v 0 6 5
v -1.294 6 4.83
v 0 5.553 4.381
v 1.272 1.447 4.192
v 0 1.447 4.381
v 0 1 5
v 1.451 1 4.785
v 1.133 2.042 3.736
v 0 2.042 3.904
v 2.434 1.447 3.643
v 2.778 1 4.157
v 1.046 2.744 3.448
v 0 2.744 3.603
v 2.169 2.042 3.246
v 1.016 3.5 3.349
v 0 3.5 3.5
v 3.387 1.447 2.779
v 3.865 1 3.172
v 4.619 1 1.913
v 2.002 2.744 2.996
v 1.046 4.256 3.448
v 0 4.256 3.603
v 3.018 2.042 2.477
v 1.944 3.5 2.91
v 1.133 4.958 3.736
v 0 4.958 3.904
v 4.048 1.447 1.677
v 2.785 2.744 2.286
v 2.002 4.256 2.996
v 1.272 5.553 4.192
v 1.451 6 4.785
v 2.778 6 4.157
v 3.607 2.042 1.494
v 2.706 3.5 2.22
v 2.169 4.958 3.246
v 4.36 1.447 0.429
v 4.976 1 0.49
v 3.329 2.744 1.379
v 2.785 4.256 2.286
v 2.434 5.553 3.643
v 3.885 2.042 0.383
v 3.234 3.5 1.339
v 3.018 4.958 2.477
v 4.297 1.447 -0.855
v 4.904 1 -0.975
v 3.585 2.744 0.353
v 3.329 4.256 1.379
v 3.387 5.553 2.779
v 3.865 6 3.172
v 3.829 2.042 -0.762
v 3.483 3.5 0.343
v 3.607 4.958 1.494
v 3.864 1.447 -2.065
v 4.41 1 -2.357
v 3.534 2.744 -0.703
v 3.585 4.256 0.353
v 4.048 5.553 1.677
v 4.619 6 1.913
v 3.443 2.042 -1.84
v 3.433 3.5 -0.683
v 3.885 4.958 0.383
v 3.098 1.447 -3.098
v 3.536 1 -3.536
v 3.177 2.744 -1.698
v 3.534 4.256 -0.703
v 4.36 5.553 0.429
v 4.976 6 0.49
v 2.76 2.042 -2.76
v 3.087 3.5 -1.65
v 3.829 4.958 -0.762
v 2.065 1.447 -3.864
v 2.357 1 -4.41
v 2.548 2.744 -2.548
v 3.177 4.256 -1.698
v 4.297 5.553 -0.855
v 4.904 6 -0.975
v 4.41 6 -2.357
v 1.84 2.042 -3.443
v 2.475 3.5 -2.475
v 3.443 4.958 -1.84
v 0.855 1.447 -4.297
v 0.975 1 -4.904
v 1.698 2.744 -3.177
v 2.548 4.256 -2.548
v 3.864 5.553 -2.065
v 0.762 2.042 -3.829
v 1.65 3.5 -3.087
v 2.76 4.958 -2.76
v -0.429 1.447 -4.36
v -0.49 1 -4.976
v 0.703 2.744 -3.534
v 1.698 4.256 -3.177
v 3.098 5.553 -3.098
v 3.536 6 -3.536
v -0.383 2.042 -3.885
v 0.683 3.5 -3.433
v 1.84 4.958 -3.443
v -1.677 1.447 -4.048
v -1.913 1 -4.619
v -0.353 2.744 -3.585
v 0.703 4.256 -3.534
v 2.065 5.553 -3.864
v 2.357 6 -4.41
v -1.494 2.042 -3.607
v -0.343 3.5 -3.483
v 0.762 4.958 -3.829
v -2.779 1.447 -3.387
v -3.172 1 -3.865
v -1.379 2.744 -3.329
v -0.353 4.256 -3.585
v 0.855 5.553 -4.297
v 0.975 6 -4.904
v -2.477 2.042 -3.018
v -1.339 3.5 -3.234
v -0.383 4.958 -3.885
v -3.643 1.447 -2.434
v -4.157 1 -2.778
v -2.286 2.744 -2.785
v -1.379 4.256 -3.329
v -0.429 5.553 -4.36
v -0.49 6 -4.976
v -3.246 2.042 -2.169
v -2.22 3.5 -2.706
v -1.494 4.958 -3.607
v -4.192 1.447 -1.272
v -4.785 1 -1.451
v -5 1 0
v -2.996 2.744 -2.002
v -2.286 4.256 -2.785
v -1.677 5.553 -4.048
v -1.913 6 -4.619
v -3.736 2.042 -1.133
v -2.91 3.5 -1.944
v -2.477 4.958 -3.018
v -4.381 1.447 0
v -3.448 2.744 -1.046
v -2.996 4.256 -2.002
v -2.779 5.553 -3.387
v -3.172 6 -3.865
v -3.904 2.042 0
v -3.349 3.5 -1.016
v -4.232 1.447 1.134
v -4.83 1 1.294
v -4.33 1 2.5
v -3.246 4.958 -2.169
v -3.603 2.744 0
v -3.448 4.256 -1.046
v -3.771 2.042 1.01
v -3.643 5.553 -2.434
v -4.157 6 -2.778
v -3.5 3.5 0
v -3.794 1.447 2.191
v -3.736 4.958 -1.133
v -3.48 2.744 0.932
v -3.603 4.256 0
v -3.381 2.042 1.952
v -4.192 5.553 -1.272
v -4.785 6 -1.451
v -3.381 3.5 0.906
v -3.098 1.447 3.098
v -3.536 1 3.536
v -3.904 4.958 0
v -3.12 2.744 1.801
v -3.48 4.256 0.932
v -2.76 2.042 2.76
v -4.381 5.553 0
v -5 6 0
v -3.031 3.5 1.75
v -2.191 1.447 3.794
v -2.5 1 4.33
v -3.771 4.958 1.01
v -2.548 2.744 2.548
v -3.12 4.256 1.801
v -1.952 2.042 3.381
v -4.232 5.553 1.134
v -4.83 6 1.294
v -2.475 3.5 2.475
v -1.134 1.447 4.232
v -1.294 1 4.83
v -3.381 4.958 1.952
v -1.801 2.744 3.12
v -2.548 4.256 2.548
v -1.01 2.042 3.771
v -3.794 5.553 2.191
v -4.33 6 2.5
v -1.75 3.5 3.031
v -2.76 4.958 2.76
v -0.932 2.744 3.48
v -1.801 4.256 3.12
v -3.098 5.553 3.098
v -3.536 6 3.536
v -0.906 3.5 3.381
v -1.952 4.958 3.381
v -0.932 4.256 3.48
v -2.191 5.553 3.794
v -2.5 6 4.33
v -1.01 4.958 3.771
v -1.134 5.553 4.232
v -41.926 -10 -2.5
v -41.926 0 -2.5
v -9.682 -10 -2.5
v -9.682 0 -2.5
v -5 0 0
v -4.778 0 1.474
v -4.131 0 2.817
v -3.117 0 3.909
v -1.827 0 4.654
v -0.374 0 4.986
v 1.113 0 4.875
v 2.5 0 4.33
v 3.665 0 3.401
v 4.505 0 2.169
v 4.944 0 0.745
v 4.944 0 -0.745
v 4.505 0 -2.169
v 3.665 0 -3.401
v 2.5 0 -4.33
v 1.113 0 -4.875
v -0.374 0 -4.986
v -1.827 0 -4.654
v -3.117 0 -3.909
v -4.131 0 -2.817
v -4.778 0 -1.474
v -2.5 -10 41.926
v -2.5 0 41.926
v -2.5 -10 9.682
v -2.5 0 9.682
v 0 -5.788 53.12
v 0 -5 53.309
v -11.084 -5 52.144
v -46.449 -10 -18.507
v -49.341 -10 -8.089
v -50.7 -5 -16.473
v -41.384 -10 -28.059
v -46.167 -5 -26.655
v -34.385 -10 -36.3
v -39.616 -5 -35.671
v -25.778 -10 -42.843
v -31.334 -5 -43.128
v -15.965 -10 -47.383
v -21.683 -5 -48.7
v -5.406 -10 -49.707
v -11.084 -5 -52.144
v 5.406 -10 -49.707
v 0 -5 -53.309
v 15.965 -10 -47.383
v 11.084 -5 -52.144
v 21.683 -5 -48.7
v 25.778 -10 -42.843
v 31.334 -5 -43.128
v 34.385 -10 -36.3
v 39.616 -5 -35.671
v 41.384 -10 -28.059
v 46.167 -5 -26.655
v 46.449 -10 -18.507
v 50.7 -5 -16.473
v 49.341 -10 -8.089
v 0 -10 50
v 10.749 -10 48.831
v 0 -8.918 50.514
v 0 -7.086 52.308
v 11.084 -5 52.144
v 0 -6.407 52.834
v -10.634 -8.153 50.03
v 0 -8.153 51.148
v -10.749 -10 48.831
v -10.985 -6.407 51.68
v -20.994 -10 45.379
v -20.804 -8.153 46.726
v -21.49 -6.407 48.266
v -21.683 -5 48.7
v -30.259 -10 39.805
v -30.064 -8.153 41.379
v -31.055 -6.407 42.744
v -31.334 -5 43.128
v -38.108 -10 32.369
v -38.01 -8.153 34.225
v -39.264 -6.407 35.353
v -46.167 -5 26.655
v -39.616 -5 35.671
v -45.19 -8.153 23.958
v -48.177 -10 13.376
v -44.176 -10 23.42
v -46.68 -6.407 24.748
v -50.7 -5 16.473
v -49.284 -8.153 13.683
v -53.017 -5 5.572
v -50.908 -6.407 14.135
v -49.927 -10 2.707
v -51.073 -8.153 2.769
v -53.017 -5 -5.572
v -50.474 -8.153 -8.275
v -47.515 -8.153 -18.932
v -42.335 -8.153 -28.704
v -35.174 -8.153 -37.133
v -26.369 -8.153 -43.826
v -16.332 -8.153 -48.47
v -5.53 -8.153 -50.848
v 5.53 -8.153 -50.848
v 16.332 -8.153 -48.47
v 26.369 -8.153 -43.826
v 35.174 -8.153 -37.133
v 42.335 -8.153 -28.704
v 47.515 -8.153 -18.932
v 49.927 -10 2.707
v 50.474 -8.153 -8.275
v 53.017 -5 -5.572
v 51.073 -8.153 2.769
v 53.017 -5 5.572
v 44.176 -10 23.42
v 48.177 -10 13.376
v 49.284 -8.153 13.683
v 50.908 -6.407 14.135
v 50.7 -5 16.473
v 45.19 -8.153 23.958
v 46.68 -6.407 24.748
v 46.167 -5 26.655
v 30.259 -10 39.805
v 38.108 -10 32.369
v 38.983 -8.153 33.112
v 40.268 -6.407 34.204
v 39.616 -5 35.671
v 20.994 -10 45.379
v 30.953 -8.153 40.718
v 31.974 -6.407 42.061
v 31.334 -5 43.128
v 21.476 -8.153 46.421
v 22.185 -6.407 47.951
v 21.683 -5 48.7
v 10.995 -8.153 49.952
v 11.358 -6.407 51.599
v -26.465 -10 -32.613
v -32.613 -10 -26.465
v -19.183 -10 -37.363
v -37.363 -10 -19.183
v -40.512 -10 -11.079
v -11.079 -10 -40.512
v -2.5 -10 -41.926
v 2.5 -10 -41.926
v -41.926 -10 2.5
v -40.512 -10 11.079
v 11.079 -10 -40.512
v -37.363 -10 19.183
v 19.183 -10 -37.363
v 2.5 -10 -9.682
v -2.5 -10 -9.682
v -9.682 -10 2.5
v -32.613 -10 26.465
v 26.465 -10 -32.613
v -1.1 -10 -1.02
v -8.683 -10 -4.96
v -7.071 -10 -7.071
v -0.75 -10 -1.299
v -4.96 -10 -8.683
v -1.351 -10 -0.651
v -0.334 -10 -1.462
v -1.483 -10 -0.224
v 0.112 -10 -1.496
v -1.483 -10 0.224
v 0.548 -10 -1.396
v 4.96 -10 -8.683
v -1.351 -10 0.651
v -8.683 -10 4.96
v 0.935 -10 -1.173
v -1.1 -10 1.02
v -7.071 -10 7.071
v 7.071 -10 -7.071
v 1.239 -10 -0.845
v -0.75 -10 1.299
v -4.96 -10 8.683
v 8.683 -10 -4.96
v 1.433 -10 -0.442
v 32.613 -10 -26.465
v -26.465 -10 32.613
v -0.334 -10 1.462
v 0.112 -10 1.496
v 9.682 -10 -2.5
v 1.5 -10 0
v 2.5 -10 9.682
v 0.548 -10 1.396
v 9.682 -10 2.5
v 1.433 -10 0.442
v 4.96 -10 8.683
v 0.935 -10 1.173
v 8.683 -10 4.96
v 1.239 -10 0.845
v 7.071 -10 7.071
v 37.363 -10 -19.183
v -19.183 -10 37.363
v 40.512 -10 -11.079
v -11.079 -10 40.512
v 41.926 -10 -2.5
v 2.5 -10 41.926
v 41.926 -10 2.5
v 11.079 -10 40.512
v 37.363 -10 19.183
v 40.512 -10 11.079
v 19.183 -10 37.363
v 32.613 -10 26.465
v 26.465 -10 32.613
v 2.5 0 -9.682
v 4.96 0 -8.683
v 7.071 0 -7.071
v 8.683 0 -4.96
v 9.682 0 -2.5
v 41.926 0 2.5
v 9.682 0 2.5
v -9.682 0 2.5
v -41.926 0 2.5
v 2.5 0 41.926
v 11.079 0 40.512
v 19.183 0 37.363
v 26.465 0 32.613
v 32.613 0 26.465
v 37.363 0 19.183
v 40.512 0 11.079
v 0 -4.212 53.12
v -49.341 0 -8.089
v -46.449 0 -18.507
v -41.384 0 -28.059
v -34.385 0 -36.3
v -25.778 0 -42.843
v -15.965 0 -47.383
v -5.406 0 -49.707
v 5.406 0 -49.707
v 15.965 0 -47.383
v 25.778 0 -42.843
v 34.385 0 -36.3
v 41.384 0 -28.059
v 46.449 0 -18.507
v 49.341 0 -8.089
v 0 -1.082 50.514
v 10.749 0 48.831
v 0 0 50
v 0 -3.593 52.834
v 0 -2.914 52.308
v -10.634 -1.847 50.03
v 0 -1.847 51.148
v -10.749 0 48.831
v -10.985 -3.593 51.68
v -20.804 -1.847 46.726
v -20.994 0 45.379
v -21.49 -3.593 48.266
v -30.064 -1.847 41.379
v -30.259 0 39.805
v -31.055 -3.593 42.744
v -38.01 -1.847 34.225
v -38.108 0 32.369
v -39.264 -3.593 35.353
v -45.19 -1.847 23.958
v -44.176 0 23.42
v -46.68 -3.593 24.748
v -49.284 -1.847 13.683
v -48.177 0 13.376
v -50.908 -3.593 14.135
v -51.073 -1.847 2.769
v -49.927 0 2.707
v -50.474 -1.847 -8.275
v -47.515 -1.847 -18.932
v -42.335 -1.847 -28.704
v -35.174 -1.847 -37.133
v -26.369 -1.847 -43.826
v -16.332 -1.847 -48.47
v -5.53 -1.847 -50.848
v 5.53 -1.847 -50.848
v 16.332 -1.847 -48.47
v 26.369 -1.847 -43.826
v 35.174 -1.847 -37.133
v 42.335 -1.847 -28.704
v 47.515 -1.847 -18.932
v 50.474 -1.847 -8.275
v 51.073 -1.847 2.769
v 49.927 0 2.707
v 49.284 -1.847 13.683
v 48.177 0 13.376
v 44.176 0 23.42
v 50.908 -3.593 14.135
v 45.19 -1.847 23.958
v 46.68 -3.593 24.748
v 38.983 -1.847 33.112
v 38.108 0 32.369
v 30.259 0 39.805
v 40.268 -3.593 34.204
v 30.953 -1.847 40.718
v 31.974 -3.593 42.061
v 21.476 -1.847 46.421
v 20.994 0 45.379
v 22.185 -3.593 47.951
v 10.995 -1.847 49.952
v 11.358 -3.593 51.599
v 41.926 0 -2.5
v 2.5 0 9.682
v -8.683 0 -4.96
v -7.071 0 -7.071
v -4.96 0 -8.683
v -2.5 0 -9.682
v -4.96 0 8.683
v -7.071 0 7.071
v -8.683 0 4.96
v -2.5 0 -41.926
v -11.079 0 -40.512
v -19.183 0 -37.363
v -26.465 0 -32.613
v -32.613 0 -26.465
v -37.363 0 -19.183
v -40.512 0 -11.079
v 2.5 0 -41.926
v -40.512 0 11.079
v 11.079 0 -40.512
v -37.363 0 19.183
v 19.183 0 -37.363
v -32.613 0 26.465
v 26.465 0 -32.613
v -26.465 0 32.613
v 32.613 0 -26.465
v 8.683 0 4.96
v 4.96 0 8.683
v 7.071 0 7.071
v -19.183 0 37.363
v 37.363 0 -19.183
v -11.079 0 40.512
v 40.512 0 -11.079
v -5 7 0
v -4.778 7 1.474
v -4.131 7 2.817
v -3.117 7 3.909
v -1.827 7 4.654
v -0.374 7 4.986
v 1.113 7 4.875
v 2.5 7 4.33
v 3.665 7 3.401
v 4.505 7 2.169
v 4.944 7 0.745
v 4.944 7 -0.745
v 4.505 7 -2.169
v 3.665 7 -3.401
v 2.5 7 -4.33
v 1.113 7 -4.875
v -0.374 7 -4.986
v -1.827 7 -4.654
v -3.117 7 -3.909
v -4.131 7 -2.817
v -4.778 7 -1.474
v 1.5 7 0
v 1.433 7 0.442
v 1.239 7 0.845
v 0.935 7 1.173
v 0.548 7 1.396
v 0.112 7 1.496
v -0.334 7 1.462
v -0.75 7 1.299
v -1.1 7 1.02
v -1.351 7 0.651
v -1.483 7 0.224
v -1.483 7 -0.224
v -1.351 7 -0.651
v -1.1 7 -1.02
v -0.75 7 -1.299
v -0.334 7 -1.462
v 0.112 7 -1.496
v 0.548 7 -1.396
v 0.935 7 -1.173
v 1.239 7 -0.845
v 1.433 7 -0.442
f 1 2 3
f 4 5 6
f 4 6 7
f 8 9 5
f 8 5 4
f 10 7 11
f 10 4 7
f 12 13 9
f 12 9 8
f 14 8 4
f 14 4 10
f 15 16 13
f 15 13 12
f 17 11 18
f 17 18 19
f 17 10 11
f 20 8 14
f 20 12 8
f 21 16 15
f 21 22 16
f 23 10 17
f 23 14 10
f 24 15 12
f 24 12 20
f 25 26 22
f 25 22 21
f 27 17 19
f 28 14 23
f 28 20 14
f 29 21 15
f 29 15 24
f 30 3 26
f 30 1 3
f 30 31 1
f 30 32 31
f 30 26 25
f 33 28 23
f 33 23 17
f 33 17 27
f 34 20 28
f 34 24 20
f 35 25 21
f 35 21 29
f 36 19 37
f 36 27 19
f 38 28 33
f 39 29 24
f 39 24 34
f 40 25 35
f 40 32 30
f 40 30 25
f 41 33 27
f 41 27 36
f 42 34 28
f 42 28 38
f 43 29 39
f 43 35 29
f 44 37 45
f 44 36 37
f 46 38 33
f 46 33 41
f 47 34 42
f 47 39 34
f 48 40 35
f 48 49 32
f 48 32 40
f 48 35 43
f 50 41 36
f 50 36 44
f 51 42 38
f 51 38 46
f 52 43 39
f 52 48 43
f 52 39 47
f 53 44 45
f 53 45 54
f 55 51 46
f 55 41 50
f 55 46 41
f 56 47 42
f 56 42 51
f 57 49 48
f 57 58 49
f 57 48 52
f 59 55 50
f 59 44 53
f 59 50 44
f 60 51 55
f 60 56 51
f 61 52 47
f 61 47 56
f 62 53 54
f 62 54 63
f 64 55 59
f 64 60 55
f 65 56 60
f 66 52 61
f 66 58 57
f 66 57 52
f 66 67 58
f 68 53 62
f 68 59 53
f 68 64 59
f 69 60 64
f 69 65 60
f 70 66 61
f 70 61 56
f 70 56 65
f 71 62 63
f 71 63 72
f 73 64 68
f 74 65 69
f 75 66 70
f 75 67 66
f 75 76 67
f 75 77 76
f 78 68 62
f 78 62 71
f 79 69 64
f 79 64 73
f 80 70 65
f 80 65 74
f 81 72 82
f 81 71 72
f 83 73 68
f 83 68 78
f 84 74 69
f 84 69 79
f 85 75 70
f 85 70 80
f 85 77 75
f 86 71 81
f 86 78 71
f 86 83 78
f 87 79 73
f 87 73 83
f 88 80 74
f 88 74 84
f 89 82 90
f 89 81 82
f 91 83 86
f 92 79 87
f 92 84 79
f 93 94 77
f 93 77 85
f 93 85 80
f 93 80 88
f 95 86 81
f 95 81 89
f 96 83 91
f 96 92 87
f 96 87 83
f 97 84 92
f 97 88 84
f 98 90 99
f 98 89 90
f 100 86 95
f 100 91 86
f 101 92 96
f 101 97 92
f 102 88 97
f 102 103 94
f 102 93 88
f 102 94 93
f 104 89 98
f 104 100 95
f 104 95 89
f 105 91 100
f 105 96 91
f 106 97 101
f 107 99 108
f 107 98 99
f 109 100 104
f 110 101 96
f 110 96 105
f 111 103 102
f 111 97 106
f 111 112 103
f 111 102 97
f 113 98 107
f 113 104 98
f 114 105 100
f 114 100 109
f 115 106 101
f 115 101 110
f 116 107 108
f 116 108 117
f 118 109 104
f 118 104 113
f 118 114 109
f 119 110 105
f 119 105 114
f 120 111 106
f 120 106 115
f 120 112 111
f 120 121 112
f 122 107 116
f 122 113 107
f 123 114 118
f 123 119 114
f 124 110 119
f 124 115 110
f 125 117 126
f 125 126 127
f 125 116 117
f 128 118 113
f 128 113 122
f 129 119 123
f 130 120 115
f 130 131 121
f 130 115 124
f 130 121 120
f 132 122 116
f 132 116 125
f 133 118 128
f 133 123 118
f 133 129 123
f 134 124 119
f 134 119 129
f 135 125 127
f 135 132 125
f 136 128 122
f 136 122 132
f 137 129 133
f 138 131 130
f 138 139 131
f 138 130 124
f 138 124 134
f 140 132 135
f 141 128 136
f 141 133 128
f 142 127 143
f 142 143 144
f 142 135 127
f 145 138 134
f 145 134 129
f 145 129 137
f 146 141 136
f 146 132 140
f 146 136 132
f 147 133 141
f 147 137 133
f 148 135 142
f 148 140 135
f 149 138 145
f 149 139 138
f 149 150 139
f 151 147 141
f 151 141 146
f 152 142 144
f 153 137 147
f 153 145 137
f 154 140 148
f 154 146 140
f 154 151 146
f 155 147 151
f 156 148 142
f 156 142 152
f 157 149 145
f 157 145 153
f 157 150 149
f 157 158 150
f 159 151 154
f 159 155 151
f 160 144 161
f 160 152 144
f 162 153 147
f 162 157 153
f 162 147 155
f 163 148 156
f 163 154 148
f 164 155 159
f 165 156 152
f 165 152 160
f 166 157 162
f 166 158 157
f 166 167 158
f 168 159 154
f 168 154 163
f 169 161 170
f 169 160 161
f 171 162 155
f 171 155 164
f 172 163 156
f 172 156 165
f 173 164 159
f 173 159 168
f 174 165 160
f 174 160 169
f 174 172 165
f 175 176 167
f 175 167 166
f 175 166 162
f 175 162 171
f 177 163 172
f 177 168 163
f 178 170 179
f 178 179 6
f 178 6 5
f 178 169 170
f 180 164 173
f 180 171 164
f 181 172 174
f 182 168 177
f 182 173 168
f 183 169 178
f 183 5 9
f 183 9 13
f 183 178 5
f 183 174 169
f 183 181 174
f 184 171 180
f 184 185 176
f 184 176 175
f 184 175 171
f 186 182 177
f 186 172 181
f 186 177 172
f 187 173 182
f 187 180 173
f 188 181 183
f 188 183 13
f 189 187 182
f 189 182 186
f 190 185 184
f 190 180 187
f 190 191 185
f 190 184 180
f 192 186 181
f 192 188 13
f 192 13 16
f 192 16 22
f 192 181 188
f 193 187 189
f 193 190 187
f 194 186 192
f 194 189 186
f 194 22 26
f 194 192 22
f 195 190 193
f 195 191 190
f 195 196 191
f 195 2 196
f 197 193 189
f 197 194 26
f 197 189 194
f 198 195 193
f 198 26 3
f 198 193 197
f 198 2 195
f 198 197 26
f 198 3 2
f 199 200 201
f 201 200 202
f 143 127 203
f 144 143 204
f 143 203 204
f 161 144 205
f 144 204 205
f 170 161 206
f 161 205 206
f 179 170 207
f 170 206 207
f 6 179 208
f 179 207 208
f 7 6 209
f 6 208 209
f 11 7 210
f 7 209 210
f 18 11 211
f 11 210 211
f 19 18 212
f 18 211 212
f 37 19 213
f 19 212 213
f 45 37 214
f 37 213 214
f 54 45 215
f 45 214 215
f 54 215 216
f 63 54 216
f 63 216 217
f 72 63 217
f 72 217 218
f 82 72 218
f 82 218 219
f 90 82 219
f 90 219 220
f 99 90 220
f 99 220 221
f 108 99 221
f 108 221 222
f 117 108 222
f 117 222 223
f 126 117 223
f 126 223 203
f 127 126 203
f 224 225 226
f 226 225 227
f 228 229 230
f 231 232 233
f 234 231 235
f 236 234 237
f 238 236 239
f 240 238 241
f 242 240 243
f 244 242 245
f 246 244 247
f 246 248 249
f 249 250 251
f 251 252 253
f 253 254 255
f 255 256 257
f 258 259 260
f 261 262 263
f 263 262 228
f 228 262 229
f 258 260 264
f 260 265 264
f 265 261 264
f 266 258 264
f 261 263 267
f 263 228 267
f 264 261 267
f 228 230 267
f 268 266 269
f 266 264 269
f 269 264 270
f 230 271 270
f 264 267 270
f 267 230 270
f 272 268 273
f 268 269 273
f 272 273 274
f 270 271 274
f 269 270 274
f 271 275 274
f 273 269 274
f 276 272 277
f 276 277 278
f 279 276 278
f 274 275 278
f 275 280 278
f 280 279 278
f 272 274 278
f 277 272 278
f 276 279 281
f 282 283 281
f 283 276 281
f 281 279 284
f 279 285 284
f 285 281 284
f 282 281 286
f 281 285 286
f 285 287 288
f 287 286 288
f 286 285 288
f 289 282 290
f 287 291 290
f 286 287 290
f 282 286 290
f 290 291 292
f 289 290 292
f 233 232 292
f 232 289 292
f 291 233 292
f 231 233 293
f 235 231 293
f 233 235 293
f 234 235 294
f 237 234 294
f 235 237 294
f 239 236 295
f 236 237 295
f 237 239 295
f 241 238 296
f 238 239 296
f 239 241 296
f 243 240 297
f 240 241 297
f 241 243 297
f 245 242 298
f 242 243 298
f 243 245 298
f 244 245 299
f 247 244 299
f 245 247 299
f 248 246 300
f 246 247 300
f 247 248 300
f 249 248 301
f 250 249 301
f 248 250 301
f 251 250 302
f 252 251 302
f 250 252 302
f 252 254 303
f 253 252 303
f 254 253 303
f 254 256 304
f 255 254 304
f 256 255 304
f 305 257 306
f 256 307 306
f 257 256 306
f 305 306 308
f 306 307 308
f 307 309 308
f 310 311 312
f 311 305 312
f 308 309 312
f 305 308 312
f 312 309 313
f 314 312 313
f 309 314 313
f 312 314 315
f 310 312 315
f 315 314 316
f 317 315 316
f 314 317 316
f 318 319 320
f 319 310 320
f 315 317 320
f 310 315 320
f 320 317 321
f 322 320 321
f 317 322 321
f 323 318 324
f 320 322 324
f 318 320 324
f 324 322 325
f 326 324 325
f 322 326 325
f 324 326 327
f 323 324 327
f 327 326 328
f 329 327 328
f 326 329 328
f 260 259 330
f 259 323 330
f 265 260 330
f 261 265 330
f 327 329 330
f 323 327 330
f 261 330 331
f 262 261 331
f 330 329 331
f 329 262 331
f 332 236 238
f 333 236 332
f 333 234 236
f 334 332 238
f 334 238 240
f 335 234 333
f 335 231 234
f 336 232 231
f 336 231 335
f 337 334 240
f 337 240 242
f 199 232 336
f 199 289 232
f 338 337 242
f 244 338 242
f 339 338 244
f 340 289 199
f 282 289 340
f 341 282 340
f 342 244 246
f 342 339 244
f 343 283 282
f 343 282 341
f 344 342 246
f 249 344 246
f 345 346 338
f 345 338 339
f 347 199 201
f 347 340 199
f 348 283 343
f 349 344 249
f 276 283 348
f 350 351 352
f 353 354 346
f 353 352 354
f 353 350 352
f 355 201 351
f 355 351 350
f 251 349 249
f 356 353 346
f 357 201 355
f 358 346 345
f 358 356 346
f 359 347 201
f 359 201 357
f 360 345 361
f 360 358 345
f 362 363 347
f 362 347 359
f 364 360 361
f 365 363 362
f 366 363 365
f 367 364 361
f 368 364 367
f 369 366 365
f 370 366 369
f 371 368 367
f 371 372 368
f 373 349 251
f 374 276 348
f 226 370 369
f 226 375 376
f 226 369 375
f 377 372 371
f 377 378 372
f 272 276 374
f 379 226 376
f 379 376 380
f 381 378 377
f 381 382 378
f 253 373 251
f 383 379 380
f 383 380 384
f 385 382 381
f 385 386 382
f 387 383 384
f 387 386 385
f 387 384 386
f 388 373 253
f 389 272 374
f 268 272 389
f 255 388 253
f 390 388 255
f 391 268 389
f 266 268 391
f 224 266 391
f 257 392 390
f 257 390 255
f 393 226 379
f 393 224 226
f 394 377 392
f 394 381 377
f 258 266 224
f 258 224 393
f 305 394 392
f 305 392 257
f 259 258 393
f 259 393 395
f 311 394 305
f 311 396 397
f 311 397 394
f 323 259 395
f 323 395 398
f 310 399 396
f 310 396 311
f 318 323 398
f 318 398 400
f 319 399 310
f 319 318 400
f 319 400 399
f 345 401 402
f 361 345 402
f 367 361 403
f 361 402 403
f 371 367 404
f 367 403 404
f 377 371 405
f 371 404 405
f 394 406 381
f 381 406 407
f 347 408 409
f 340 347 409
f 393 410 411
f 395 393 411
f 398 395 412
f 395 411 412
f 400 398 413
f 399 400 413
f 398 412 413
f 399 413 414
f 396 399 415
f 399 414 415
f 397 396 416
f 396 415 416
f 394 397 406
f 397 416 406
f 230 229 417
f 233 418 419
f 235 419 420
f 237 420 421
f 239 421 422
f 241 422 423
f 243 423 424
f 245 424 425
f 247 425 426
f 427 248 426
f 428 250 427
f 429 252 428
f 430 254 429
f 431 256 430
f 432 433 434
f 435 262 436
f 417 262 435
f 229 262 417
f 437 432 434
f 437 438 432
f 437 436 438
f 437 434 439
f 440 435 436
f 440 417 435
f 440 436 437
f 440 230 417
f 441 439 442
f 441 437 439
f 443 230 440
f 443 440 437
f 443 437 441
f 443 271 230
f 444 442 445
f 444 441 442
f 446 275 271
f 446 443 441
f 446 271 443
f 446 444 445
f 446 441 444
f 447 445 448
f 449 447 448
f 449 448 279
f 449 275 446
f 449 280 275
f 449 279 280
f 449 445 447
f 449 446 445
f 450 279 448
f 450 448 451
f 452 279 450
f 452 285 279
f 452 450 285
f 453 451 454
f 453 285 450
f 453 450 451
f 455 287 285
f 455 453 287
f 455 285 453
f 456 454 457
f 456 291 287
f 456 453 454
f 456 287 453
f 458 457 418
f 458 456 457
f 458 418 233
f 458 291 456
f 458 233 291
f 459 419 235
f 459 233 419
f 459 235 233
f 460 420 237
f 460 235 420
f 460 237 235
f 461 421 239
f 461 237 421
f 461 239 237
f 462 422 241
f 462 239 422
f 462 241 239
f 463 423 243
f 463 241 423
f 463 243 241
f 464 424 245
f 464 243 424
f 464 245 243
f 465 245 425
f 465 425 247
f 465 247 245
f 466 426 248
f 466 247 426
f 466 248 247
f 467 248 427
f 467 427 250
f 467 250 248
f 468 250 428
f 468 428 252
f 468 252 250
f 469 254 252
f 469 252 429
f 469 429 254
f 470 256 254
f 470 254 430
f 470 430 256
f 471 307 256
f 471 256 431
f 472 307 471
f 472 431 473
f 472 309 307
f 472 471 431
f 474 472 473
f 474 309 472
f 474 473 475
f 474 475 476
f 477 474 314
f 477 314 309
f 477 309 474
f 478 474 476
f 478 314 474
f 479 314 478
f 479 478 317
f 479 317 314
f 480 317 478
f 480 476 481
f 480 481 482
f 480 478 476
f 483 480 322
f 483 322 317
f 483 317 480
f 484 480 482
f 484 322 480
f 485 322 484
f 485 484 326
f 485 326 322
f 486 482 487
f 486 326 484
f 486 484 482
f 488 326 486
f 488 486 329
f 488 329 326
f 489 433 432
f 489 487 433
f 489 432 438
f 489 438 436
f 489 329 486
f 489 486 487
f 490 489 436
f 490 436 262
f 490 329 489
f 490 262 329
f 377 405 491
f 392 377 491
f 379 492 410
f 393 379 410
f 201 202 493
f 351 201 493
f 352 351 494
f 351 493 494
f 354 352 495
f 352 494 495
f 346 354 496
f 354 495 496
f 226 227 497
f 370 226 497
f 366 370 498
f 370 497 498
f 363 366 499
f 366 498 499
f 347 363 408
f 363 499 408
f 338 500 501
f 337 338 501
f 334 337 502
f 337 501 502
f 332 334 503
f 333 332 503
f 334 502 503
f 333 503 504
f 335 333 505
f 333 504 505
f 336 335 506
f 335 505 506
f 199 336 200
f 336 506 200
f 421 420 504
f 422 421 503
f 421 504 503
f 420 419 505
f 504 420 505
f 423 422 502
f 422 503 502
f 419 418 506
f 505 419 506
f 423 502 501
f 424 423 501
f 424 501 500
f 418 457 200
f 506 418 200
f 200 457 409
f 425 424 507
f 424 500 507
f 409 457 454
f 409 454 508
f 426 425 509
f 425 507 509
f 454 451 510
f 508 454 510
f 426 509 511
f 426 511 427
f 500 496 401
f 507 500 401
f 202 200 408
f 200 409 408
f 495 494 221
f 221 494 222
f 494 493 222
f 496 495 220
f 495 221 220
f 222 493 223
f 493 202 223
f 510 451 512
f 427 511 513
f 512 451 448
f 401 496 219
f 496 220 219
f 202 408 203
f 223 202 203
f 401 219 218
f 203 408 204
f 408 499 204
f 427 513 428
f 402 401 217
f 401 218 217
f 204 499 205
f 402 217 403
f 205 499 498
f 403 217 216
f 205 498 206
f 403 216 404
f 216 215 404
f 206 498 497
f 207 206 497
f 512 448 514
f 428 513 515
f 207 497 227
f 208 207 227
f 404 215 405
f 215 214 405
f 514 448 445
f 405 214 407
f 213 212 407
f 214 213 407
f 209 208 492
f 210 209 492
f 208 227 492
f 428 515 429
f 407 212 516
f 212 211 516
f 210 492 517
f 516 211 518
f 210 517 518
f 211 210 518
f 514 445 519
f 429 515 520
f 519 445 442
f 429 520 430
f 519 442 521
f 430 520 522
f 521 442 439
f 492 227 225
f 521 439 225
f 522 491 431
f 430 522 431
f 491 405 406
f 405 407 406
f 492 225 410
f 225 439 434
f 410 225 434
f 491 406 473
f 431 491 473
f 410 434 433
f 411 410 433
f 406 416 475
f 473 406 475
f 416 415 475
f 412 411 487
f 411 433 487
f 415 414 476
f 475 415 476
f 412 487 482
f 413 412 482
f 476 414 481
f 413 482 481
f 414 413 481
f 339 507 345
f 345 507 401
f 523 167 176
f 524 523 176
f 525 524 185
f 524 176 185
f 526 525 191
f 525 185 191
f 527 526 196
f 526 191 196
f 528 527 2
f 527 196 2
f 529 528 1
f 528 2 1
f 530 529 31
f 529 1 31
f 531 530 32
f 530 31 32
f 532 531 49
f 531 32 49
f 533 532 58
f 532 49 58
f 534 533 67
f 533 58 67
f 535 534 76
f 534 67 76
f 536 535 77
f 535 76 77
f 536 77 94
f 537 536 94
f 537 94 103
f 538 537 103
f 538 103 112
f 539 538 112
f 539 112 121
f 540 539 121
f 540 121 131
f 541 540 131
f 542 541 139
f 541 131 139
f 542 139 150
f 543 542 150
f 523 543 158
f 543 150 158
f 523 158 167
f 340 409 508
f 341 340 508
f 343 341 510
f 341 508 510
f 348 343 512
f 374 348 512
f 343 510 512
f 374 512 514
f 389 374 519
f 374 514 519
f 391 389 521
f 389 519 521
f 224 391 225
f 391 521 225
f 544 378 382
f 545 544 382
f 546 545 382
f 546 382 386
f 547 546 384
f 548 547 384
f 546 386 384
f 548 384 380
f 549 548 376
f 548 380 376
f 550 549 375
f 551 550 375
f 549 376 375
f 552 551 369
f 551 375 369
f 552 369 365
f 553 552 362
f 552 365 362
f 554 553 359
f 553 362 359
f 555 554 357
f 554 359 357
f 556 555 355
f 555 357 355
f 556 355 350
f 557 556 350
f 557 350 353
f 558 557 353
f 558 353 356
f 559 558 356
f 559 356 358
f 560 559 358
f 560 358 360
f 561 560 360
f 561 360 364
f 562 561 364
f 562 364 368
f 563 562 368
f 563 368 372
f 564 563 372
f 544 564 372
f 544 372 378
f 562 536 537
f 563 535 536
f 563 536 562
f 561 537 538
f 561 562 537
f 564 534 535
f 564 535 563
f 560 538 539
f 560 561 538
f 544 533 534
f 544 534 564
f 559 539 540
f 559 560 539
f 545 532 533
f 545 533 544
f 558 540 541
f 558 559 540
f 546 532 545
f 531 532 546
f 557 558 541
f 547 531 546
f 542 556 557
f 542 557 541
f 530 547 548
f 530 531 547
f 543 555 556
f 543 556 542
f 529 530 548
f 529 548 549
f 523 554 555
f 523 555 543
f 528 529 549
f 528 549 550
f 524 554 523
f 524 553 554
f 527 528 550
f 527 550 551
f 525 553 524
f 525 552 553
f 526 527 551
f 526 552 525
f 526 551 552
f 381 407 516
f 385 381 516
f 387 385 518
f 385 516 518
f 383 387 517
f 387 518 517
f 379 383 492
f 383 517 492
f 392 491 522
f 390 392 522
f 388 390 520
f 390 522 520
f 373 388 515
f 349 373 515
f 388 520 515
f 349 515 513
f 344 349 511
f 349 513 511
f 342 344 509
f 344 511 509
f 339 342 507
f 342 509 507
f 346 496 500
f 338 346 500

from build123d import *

# Parameters (mm, degrees)
F0_R      = 50
F1_DEPTH  = 10
F6_R      = 5
F7_DEPTH  = 7
F5_R      = 1.5
F8_DEPTH  = 17.001
F13_DEPTH = 10.001


with BuildPart() as f1:
    # F0 (on Front) → F1 (new body)
    with BuildSketch(Plane.XZ):
        Circle(F0_R)
    extrude(amount=F1_DEPTH)

    # F3 (on Right) → F4 (revolve)
    with BuildSketch(Plane.YZ):
        with BuildLine():
            Line((-10, 50), (0, 50))
            add(Edge.make_bspline(
                [(0, 50), (-2.587933, 50.855839), (-2.303226, 52.902121), (-5, 53.30912)],
                knots=[0, 0, 0, 0, 5.995855, 5.995855, 5.995855, 5.995855], degree=3))
            add(Edge.make_bspline(
                [(-10, 50), (-7.412067, 50.855839), (-7.696774, 52.902121), (-5, 53.30912)],
                knots=[0, 0, 0, 0, 5.995855, 5.995855, 5.995855, 5.995855], degree=3))
        make_face()
    revolve(axis=Axis((0, -20.942401, 0), (0, -1, 0)))

    # F6 (on face) → F7 (join)
    with BuildSketch(Plane(origin=(0, 0, 0), x_dir=(-1, 0, 0), z_dir=(0, 1, 0))):
        Circle(F6_R)
    extrude(amount=F7_DEPTH)

    # F5 (on face) → F8 (cut, through all)
    with BuildSketch(Plane.XZ.offset(10)):
        Circle(F5_R)
    extrude(amount=-F8_DEPTH, mode=Mode.SUBTRACT)

    # F9 (on Right) → F11 (revolve, cut)
    with BuildSketch(Plane.YZ):
        with BuildLine():
            Line((6, 5), (1, 5))
            ThreePointArc((1, 5), (3.5, 3.5), (6, 5))
        make_face()
    revolve(axis=Axis((0, 3.22971, 0), (0, 1, 0)), mode=Mode.SUBTRACT)

    # F12 (on face) → F13 (cut, through all)
    with BuildSketch(Plane(origin=(0, 0, 0), x_dir=(-1, 0, 0), z_dir=(0, 1, 0))):
        with BuildLine():
            Line((9.682458, 2.5), (41.925529, 2.5))
            ThreePointArc((41.925529, 2.5), (29.698485, 29.698485), (2.5, 41.925529))
            Line((2.5, 41.925529), (2.5, 9.682458))
            ThreePointArc((2.5, 9.682458), (7.071068, 7.071068), (9.682458, 2.5))
        make_face()
        with BuildLine():
            ThreePointArc((2.5, -41.925529), (29.698485, -29.698485), (41.925529, -2.5))
            Line((41.925529, -2.5), (9.682458, -2.5))
            ThreePointArc((9.682458, -2.5), (7.071068, -7.071068), (2.5, -9.682458))
            Line((2.5, -9.682458), (2.5, -41.925529))
        make_face()
        with BuildLine():
            Line((-2.5, 9.682458), (-2.5, 41.925529))
            ThreePointArc((-2.5, 41.925529), (-29.698485, 29.698485), (-41.925529, 2.5))
            Line((-41.925529, 2.5), (-9.682458, 2.5))
            ThreePointArc((-9.682458, 2.5), (-7.071068, 7.071068), (-2.5, 9.682458))
        make_face()
        with BuildLine():
            ThreePointArc((-2.5, -9.682458), (-7.071068, -7.071068), (-9.682458, -2.5))
            Line((-9.682458, -2.5), (-41.925529, -2.5))
            ThreePointArc((-41.925529, -2.5), (-29.698485, -29.698485), (-2.5, -41.925529))
            Line((-2.5, -41.925529), (-2.5, -9.682458))
        make_face()
    extrude(amount=-F13_DEPTH, mode=Mode.SUBTRACT)


solid = f1.part
